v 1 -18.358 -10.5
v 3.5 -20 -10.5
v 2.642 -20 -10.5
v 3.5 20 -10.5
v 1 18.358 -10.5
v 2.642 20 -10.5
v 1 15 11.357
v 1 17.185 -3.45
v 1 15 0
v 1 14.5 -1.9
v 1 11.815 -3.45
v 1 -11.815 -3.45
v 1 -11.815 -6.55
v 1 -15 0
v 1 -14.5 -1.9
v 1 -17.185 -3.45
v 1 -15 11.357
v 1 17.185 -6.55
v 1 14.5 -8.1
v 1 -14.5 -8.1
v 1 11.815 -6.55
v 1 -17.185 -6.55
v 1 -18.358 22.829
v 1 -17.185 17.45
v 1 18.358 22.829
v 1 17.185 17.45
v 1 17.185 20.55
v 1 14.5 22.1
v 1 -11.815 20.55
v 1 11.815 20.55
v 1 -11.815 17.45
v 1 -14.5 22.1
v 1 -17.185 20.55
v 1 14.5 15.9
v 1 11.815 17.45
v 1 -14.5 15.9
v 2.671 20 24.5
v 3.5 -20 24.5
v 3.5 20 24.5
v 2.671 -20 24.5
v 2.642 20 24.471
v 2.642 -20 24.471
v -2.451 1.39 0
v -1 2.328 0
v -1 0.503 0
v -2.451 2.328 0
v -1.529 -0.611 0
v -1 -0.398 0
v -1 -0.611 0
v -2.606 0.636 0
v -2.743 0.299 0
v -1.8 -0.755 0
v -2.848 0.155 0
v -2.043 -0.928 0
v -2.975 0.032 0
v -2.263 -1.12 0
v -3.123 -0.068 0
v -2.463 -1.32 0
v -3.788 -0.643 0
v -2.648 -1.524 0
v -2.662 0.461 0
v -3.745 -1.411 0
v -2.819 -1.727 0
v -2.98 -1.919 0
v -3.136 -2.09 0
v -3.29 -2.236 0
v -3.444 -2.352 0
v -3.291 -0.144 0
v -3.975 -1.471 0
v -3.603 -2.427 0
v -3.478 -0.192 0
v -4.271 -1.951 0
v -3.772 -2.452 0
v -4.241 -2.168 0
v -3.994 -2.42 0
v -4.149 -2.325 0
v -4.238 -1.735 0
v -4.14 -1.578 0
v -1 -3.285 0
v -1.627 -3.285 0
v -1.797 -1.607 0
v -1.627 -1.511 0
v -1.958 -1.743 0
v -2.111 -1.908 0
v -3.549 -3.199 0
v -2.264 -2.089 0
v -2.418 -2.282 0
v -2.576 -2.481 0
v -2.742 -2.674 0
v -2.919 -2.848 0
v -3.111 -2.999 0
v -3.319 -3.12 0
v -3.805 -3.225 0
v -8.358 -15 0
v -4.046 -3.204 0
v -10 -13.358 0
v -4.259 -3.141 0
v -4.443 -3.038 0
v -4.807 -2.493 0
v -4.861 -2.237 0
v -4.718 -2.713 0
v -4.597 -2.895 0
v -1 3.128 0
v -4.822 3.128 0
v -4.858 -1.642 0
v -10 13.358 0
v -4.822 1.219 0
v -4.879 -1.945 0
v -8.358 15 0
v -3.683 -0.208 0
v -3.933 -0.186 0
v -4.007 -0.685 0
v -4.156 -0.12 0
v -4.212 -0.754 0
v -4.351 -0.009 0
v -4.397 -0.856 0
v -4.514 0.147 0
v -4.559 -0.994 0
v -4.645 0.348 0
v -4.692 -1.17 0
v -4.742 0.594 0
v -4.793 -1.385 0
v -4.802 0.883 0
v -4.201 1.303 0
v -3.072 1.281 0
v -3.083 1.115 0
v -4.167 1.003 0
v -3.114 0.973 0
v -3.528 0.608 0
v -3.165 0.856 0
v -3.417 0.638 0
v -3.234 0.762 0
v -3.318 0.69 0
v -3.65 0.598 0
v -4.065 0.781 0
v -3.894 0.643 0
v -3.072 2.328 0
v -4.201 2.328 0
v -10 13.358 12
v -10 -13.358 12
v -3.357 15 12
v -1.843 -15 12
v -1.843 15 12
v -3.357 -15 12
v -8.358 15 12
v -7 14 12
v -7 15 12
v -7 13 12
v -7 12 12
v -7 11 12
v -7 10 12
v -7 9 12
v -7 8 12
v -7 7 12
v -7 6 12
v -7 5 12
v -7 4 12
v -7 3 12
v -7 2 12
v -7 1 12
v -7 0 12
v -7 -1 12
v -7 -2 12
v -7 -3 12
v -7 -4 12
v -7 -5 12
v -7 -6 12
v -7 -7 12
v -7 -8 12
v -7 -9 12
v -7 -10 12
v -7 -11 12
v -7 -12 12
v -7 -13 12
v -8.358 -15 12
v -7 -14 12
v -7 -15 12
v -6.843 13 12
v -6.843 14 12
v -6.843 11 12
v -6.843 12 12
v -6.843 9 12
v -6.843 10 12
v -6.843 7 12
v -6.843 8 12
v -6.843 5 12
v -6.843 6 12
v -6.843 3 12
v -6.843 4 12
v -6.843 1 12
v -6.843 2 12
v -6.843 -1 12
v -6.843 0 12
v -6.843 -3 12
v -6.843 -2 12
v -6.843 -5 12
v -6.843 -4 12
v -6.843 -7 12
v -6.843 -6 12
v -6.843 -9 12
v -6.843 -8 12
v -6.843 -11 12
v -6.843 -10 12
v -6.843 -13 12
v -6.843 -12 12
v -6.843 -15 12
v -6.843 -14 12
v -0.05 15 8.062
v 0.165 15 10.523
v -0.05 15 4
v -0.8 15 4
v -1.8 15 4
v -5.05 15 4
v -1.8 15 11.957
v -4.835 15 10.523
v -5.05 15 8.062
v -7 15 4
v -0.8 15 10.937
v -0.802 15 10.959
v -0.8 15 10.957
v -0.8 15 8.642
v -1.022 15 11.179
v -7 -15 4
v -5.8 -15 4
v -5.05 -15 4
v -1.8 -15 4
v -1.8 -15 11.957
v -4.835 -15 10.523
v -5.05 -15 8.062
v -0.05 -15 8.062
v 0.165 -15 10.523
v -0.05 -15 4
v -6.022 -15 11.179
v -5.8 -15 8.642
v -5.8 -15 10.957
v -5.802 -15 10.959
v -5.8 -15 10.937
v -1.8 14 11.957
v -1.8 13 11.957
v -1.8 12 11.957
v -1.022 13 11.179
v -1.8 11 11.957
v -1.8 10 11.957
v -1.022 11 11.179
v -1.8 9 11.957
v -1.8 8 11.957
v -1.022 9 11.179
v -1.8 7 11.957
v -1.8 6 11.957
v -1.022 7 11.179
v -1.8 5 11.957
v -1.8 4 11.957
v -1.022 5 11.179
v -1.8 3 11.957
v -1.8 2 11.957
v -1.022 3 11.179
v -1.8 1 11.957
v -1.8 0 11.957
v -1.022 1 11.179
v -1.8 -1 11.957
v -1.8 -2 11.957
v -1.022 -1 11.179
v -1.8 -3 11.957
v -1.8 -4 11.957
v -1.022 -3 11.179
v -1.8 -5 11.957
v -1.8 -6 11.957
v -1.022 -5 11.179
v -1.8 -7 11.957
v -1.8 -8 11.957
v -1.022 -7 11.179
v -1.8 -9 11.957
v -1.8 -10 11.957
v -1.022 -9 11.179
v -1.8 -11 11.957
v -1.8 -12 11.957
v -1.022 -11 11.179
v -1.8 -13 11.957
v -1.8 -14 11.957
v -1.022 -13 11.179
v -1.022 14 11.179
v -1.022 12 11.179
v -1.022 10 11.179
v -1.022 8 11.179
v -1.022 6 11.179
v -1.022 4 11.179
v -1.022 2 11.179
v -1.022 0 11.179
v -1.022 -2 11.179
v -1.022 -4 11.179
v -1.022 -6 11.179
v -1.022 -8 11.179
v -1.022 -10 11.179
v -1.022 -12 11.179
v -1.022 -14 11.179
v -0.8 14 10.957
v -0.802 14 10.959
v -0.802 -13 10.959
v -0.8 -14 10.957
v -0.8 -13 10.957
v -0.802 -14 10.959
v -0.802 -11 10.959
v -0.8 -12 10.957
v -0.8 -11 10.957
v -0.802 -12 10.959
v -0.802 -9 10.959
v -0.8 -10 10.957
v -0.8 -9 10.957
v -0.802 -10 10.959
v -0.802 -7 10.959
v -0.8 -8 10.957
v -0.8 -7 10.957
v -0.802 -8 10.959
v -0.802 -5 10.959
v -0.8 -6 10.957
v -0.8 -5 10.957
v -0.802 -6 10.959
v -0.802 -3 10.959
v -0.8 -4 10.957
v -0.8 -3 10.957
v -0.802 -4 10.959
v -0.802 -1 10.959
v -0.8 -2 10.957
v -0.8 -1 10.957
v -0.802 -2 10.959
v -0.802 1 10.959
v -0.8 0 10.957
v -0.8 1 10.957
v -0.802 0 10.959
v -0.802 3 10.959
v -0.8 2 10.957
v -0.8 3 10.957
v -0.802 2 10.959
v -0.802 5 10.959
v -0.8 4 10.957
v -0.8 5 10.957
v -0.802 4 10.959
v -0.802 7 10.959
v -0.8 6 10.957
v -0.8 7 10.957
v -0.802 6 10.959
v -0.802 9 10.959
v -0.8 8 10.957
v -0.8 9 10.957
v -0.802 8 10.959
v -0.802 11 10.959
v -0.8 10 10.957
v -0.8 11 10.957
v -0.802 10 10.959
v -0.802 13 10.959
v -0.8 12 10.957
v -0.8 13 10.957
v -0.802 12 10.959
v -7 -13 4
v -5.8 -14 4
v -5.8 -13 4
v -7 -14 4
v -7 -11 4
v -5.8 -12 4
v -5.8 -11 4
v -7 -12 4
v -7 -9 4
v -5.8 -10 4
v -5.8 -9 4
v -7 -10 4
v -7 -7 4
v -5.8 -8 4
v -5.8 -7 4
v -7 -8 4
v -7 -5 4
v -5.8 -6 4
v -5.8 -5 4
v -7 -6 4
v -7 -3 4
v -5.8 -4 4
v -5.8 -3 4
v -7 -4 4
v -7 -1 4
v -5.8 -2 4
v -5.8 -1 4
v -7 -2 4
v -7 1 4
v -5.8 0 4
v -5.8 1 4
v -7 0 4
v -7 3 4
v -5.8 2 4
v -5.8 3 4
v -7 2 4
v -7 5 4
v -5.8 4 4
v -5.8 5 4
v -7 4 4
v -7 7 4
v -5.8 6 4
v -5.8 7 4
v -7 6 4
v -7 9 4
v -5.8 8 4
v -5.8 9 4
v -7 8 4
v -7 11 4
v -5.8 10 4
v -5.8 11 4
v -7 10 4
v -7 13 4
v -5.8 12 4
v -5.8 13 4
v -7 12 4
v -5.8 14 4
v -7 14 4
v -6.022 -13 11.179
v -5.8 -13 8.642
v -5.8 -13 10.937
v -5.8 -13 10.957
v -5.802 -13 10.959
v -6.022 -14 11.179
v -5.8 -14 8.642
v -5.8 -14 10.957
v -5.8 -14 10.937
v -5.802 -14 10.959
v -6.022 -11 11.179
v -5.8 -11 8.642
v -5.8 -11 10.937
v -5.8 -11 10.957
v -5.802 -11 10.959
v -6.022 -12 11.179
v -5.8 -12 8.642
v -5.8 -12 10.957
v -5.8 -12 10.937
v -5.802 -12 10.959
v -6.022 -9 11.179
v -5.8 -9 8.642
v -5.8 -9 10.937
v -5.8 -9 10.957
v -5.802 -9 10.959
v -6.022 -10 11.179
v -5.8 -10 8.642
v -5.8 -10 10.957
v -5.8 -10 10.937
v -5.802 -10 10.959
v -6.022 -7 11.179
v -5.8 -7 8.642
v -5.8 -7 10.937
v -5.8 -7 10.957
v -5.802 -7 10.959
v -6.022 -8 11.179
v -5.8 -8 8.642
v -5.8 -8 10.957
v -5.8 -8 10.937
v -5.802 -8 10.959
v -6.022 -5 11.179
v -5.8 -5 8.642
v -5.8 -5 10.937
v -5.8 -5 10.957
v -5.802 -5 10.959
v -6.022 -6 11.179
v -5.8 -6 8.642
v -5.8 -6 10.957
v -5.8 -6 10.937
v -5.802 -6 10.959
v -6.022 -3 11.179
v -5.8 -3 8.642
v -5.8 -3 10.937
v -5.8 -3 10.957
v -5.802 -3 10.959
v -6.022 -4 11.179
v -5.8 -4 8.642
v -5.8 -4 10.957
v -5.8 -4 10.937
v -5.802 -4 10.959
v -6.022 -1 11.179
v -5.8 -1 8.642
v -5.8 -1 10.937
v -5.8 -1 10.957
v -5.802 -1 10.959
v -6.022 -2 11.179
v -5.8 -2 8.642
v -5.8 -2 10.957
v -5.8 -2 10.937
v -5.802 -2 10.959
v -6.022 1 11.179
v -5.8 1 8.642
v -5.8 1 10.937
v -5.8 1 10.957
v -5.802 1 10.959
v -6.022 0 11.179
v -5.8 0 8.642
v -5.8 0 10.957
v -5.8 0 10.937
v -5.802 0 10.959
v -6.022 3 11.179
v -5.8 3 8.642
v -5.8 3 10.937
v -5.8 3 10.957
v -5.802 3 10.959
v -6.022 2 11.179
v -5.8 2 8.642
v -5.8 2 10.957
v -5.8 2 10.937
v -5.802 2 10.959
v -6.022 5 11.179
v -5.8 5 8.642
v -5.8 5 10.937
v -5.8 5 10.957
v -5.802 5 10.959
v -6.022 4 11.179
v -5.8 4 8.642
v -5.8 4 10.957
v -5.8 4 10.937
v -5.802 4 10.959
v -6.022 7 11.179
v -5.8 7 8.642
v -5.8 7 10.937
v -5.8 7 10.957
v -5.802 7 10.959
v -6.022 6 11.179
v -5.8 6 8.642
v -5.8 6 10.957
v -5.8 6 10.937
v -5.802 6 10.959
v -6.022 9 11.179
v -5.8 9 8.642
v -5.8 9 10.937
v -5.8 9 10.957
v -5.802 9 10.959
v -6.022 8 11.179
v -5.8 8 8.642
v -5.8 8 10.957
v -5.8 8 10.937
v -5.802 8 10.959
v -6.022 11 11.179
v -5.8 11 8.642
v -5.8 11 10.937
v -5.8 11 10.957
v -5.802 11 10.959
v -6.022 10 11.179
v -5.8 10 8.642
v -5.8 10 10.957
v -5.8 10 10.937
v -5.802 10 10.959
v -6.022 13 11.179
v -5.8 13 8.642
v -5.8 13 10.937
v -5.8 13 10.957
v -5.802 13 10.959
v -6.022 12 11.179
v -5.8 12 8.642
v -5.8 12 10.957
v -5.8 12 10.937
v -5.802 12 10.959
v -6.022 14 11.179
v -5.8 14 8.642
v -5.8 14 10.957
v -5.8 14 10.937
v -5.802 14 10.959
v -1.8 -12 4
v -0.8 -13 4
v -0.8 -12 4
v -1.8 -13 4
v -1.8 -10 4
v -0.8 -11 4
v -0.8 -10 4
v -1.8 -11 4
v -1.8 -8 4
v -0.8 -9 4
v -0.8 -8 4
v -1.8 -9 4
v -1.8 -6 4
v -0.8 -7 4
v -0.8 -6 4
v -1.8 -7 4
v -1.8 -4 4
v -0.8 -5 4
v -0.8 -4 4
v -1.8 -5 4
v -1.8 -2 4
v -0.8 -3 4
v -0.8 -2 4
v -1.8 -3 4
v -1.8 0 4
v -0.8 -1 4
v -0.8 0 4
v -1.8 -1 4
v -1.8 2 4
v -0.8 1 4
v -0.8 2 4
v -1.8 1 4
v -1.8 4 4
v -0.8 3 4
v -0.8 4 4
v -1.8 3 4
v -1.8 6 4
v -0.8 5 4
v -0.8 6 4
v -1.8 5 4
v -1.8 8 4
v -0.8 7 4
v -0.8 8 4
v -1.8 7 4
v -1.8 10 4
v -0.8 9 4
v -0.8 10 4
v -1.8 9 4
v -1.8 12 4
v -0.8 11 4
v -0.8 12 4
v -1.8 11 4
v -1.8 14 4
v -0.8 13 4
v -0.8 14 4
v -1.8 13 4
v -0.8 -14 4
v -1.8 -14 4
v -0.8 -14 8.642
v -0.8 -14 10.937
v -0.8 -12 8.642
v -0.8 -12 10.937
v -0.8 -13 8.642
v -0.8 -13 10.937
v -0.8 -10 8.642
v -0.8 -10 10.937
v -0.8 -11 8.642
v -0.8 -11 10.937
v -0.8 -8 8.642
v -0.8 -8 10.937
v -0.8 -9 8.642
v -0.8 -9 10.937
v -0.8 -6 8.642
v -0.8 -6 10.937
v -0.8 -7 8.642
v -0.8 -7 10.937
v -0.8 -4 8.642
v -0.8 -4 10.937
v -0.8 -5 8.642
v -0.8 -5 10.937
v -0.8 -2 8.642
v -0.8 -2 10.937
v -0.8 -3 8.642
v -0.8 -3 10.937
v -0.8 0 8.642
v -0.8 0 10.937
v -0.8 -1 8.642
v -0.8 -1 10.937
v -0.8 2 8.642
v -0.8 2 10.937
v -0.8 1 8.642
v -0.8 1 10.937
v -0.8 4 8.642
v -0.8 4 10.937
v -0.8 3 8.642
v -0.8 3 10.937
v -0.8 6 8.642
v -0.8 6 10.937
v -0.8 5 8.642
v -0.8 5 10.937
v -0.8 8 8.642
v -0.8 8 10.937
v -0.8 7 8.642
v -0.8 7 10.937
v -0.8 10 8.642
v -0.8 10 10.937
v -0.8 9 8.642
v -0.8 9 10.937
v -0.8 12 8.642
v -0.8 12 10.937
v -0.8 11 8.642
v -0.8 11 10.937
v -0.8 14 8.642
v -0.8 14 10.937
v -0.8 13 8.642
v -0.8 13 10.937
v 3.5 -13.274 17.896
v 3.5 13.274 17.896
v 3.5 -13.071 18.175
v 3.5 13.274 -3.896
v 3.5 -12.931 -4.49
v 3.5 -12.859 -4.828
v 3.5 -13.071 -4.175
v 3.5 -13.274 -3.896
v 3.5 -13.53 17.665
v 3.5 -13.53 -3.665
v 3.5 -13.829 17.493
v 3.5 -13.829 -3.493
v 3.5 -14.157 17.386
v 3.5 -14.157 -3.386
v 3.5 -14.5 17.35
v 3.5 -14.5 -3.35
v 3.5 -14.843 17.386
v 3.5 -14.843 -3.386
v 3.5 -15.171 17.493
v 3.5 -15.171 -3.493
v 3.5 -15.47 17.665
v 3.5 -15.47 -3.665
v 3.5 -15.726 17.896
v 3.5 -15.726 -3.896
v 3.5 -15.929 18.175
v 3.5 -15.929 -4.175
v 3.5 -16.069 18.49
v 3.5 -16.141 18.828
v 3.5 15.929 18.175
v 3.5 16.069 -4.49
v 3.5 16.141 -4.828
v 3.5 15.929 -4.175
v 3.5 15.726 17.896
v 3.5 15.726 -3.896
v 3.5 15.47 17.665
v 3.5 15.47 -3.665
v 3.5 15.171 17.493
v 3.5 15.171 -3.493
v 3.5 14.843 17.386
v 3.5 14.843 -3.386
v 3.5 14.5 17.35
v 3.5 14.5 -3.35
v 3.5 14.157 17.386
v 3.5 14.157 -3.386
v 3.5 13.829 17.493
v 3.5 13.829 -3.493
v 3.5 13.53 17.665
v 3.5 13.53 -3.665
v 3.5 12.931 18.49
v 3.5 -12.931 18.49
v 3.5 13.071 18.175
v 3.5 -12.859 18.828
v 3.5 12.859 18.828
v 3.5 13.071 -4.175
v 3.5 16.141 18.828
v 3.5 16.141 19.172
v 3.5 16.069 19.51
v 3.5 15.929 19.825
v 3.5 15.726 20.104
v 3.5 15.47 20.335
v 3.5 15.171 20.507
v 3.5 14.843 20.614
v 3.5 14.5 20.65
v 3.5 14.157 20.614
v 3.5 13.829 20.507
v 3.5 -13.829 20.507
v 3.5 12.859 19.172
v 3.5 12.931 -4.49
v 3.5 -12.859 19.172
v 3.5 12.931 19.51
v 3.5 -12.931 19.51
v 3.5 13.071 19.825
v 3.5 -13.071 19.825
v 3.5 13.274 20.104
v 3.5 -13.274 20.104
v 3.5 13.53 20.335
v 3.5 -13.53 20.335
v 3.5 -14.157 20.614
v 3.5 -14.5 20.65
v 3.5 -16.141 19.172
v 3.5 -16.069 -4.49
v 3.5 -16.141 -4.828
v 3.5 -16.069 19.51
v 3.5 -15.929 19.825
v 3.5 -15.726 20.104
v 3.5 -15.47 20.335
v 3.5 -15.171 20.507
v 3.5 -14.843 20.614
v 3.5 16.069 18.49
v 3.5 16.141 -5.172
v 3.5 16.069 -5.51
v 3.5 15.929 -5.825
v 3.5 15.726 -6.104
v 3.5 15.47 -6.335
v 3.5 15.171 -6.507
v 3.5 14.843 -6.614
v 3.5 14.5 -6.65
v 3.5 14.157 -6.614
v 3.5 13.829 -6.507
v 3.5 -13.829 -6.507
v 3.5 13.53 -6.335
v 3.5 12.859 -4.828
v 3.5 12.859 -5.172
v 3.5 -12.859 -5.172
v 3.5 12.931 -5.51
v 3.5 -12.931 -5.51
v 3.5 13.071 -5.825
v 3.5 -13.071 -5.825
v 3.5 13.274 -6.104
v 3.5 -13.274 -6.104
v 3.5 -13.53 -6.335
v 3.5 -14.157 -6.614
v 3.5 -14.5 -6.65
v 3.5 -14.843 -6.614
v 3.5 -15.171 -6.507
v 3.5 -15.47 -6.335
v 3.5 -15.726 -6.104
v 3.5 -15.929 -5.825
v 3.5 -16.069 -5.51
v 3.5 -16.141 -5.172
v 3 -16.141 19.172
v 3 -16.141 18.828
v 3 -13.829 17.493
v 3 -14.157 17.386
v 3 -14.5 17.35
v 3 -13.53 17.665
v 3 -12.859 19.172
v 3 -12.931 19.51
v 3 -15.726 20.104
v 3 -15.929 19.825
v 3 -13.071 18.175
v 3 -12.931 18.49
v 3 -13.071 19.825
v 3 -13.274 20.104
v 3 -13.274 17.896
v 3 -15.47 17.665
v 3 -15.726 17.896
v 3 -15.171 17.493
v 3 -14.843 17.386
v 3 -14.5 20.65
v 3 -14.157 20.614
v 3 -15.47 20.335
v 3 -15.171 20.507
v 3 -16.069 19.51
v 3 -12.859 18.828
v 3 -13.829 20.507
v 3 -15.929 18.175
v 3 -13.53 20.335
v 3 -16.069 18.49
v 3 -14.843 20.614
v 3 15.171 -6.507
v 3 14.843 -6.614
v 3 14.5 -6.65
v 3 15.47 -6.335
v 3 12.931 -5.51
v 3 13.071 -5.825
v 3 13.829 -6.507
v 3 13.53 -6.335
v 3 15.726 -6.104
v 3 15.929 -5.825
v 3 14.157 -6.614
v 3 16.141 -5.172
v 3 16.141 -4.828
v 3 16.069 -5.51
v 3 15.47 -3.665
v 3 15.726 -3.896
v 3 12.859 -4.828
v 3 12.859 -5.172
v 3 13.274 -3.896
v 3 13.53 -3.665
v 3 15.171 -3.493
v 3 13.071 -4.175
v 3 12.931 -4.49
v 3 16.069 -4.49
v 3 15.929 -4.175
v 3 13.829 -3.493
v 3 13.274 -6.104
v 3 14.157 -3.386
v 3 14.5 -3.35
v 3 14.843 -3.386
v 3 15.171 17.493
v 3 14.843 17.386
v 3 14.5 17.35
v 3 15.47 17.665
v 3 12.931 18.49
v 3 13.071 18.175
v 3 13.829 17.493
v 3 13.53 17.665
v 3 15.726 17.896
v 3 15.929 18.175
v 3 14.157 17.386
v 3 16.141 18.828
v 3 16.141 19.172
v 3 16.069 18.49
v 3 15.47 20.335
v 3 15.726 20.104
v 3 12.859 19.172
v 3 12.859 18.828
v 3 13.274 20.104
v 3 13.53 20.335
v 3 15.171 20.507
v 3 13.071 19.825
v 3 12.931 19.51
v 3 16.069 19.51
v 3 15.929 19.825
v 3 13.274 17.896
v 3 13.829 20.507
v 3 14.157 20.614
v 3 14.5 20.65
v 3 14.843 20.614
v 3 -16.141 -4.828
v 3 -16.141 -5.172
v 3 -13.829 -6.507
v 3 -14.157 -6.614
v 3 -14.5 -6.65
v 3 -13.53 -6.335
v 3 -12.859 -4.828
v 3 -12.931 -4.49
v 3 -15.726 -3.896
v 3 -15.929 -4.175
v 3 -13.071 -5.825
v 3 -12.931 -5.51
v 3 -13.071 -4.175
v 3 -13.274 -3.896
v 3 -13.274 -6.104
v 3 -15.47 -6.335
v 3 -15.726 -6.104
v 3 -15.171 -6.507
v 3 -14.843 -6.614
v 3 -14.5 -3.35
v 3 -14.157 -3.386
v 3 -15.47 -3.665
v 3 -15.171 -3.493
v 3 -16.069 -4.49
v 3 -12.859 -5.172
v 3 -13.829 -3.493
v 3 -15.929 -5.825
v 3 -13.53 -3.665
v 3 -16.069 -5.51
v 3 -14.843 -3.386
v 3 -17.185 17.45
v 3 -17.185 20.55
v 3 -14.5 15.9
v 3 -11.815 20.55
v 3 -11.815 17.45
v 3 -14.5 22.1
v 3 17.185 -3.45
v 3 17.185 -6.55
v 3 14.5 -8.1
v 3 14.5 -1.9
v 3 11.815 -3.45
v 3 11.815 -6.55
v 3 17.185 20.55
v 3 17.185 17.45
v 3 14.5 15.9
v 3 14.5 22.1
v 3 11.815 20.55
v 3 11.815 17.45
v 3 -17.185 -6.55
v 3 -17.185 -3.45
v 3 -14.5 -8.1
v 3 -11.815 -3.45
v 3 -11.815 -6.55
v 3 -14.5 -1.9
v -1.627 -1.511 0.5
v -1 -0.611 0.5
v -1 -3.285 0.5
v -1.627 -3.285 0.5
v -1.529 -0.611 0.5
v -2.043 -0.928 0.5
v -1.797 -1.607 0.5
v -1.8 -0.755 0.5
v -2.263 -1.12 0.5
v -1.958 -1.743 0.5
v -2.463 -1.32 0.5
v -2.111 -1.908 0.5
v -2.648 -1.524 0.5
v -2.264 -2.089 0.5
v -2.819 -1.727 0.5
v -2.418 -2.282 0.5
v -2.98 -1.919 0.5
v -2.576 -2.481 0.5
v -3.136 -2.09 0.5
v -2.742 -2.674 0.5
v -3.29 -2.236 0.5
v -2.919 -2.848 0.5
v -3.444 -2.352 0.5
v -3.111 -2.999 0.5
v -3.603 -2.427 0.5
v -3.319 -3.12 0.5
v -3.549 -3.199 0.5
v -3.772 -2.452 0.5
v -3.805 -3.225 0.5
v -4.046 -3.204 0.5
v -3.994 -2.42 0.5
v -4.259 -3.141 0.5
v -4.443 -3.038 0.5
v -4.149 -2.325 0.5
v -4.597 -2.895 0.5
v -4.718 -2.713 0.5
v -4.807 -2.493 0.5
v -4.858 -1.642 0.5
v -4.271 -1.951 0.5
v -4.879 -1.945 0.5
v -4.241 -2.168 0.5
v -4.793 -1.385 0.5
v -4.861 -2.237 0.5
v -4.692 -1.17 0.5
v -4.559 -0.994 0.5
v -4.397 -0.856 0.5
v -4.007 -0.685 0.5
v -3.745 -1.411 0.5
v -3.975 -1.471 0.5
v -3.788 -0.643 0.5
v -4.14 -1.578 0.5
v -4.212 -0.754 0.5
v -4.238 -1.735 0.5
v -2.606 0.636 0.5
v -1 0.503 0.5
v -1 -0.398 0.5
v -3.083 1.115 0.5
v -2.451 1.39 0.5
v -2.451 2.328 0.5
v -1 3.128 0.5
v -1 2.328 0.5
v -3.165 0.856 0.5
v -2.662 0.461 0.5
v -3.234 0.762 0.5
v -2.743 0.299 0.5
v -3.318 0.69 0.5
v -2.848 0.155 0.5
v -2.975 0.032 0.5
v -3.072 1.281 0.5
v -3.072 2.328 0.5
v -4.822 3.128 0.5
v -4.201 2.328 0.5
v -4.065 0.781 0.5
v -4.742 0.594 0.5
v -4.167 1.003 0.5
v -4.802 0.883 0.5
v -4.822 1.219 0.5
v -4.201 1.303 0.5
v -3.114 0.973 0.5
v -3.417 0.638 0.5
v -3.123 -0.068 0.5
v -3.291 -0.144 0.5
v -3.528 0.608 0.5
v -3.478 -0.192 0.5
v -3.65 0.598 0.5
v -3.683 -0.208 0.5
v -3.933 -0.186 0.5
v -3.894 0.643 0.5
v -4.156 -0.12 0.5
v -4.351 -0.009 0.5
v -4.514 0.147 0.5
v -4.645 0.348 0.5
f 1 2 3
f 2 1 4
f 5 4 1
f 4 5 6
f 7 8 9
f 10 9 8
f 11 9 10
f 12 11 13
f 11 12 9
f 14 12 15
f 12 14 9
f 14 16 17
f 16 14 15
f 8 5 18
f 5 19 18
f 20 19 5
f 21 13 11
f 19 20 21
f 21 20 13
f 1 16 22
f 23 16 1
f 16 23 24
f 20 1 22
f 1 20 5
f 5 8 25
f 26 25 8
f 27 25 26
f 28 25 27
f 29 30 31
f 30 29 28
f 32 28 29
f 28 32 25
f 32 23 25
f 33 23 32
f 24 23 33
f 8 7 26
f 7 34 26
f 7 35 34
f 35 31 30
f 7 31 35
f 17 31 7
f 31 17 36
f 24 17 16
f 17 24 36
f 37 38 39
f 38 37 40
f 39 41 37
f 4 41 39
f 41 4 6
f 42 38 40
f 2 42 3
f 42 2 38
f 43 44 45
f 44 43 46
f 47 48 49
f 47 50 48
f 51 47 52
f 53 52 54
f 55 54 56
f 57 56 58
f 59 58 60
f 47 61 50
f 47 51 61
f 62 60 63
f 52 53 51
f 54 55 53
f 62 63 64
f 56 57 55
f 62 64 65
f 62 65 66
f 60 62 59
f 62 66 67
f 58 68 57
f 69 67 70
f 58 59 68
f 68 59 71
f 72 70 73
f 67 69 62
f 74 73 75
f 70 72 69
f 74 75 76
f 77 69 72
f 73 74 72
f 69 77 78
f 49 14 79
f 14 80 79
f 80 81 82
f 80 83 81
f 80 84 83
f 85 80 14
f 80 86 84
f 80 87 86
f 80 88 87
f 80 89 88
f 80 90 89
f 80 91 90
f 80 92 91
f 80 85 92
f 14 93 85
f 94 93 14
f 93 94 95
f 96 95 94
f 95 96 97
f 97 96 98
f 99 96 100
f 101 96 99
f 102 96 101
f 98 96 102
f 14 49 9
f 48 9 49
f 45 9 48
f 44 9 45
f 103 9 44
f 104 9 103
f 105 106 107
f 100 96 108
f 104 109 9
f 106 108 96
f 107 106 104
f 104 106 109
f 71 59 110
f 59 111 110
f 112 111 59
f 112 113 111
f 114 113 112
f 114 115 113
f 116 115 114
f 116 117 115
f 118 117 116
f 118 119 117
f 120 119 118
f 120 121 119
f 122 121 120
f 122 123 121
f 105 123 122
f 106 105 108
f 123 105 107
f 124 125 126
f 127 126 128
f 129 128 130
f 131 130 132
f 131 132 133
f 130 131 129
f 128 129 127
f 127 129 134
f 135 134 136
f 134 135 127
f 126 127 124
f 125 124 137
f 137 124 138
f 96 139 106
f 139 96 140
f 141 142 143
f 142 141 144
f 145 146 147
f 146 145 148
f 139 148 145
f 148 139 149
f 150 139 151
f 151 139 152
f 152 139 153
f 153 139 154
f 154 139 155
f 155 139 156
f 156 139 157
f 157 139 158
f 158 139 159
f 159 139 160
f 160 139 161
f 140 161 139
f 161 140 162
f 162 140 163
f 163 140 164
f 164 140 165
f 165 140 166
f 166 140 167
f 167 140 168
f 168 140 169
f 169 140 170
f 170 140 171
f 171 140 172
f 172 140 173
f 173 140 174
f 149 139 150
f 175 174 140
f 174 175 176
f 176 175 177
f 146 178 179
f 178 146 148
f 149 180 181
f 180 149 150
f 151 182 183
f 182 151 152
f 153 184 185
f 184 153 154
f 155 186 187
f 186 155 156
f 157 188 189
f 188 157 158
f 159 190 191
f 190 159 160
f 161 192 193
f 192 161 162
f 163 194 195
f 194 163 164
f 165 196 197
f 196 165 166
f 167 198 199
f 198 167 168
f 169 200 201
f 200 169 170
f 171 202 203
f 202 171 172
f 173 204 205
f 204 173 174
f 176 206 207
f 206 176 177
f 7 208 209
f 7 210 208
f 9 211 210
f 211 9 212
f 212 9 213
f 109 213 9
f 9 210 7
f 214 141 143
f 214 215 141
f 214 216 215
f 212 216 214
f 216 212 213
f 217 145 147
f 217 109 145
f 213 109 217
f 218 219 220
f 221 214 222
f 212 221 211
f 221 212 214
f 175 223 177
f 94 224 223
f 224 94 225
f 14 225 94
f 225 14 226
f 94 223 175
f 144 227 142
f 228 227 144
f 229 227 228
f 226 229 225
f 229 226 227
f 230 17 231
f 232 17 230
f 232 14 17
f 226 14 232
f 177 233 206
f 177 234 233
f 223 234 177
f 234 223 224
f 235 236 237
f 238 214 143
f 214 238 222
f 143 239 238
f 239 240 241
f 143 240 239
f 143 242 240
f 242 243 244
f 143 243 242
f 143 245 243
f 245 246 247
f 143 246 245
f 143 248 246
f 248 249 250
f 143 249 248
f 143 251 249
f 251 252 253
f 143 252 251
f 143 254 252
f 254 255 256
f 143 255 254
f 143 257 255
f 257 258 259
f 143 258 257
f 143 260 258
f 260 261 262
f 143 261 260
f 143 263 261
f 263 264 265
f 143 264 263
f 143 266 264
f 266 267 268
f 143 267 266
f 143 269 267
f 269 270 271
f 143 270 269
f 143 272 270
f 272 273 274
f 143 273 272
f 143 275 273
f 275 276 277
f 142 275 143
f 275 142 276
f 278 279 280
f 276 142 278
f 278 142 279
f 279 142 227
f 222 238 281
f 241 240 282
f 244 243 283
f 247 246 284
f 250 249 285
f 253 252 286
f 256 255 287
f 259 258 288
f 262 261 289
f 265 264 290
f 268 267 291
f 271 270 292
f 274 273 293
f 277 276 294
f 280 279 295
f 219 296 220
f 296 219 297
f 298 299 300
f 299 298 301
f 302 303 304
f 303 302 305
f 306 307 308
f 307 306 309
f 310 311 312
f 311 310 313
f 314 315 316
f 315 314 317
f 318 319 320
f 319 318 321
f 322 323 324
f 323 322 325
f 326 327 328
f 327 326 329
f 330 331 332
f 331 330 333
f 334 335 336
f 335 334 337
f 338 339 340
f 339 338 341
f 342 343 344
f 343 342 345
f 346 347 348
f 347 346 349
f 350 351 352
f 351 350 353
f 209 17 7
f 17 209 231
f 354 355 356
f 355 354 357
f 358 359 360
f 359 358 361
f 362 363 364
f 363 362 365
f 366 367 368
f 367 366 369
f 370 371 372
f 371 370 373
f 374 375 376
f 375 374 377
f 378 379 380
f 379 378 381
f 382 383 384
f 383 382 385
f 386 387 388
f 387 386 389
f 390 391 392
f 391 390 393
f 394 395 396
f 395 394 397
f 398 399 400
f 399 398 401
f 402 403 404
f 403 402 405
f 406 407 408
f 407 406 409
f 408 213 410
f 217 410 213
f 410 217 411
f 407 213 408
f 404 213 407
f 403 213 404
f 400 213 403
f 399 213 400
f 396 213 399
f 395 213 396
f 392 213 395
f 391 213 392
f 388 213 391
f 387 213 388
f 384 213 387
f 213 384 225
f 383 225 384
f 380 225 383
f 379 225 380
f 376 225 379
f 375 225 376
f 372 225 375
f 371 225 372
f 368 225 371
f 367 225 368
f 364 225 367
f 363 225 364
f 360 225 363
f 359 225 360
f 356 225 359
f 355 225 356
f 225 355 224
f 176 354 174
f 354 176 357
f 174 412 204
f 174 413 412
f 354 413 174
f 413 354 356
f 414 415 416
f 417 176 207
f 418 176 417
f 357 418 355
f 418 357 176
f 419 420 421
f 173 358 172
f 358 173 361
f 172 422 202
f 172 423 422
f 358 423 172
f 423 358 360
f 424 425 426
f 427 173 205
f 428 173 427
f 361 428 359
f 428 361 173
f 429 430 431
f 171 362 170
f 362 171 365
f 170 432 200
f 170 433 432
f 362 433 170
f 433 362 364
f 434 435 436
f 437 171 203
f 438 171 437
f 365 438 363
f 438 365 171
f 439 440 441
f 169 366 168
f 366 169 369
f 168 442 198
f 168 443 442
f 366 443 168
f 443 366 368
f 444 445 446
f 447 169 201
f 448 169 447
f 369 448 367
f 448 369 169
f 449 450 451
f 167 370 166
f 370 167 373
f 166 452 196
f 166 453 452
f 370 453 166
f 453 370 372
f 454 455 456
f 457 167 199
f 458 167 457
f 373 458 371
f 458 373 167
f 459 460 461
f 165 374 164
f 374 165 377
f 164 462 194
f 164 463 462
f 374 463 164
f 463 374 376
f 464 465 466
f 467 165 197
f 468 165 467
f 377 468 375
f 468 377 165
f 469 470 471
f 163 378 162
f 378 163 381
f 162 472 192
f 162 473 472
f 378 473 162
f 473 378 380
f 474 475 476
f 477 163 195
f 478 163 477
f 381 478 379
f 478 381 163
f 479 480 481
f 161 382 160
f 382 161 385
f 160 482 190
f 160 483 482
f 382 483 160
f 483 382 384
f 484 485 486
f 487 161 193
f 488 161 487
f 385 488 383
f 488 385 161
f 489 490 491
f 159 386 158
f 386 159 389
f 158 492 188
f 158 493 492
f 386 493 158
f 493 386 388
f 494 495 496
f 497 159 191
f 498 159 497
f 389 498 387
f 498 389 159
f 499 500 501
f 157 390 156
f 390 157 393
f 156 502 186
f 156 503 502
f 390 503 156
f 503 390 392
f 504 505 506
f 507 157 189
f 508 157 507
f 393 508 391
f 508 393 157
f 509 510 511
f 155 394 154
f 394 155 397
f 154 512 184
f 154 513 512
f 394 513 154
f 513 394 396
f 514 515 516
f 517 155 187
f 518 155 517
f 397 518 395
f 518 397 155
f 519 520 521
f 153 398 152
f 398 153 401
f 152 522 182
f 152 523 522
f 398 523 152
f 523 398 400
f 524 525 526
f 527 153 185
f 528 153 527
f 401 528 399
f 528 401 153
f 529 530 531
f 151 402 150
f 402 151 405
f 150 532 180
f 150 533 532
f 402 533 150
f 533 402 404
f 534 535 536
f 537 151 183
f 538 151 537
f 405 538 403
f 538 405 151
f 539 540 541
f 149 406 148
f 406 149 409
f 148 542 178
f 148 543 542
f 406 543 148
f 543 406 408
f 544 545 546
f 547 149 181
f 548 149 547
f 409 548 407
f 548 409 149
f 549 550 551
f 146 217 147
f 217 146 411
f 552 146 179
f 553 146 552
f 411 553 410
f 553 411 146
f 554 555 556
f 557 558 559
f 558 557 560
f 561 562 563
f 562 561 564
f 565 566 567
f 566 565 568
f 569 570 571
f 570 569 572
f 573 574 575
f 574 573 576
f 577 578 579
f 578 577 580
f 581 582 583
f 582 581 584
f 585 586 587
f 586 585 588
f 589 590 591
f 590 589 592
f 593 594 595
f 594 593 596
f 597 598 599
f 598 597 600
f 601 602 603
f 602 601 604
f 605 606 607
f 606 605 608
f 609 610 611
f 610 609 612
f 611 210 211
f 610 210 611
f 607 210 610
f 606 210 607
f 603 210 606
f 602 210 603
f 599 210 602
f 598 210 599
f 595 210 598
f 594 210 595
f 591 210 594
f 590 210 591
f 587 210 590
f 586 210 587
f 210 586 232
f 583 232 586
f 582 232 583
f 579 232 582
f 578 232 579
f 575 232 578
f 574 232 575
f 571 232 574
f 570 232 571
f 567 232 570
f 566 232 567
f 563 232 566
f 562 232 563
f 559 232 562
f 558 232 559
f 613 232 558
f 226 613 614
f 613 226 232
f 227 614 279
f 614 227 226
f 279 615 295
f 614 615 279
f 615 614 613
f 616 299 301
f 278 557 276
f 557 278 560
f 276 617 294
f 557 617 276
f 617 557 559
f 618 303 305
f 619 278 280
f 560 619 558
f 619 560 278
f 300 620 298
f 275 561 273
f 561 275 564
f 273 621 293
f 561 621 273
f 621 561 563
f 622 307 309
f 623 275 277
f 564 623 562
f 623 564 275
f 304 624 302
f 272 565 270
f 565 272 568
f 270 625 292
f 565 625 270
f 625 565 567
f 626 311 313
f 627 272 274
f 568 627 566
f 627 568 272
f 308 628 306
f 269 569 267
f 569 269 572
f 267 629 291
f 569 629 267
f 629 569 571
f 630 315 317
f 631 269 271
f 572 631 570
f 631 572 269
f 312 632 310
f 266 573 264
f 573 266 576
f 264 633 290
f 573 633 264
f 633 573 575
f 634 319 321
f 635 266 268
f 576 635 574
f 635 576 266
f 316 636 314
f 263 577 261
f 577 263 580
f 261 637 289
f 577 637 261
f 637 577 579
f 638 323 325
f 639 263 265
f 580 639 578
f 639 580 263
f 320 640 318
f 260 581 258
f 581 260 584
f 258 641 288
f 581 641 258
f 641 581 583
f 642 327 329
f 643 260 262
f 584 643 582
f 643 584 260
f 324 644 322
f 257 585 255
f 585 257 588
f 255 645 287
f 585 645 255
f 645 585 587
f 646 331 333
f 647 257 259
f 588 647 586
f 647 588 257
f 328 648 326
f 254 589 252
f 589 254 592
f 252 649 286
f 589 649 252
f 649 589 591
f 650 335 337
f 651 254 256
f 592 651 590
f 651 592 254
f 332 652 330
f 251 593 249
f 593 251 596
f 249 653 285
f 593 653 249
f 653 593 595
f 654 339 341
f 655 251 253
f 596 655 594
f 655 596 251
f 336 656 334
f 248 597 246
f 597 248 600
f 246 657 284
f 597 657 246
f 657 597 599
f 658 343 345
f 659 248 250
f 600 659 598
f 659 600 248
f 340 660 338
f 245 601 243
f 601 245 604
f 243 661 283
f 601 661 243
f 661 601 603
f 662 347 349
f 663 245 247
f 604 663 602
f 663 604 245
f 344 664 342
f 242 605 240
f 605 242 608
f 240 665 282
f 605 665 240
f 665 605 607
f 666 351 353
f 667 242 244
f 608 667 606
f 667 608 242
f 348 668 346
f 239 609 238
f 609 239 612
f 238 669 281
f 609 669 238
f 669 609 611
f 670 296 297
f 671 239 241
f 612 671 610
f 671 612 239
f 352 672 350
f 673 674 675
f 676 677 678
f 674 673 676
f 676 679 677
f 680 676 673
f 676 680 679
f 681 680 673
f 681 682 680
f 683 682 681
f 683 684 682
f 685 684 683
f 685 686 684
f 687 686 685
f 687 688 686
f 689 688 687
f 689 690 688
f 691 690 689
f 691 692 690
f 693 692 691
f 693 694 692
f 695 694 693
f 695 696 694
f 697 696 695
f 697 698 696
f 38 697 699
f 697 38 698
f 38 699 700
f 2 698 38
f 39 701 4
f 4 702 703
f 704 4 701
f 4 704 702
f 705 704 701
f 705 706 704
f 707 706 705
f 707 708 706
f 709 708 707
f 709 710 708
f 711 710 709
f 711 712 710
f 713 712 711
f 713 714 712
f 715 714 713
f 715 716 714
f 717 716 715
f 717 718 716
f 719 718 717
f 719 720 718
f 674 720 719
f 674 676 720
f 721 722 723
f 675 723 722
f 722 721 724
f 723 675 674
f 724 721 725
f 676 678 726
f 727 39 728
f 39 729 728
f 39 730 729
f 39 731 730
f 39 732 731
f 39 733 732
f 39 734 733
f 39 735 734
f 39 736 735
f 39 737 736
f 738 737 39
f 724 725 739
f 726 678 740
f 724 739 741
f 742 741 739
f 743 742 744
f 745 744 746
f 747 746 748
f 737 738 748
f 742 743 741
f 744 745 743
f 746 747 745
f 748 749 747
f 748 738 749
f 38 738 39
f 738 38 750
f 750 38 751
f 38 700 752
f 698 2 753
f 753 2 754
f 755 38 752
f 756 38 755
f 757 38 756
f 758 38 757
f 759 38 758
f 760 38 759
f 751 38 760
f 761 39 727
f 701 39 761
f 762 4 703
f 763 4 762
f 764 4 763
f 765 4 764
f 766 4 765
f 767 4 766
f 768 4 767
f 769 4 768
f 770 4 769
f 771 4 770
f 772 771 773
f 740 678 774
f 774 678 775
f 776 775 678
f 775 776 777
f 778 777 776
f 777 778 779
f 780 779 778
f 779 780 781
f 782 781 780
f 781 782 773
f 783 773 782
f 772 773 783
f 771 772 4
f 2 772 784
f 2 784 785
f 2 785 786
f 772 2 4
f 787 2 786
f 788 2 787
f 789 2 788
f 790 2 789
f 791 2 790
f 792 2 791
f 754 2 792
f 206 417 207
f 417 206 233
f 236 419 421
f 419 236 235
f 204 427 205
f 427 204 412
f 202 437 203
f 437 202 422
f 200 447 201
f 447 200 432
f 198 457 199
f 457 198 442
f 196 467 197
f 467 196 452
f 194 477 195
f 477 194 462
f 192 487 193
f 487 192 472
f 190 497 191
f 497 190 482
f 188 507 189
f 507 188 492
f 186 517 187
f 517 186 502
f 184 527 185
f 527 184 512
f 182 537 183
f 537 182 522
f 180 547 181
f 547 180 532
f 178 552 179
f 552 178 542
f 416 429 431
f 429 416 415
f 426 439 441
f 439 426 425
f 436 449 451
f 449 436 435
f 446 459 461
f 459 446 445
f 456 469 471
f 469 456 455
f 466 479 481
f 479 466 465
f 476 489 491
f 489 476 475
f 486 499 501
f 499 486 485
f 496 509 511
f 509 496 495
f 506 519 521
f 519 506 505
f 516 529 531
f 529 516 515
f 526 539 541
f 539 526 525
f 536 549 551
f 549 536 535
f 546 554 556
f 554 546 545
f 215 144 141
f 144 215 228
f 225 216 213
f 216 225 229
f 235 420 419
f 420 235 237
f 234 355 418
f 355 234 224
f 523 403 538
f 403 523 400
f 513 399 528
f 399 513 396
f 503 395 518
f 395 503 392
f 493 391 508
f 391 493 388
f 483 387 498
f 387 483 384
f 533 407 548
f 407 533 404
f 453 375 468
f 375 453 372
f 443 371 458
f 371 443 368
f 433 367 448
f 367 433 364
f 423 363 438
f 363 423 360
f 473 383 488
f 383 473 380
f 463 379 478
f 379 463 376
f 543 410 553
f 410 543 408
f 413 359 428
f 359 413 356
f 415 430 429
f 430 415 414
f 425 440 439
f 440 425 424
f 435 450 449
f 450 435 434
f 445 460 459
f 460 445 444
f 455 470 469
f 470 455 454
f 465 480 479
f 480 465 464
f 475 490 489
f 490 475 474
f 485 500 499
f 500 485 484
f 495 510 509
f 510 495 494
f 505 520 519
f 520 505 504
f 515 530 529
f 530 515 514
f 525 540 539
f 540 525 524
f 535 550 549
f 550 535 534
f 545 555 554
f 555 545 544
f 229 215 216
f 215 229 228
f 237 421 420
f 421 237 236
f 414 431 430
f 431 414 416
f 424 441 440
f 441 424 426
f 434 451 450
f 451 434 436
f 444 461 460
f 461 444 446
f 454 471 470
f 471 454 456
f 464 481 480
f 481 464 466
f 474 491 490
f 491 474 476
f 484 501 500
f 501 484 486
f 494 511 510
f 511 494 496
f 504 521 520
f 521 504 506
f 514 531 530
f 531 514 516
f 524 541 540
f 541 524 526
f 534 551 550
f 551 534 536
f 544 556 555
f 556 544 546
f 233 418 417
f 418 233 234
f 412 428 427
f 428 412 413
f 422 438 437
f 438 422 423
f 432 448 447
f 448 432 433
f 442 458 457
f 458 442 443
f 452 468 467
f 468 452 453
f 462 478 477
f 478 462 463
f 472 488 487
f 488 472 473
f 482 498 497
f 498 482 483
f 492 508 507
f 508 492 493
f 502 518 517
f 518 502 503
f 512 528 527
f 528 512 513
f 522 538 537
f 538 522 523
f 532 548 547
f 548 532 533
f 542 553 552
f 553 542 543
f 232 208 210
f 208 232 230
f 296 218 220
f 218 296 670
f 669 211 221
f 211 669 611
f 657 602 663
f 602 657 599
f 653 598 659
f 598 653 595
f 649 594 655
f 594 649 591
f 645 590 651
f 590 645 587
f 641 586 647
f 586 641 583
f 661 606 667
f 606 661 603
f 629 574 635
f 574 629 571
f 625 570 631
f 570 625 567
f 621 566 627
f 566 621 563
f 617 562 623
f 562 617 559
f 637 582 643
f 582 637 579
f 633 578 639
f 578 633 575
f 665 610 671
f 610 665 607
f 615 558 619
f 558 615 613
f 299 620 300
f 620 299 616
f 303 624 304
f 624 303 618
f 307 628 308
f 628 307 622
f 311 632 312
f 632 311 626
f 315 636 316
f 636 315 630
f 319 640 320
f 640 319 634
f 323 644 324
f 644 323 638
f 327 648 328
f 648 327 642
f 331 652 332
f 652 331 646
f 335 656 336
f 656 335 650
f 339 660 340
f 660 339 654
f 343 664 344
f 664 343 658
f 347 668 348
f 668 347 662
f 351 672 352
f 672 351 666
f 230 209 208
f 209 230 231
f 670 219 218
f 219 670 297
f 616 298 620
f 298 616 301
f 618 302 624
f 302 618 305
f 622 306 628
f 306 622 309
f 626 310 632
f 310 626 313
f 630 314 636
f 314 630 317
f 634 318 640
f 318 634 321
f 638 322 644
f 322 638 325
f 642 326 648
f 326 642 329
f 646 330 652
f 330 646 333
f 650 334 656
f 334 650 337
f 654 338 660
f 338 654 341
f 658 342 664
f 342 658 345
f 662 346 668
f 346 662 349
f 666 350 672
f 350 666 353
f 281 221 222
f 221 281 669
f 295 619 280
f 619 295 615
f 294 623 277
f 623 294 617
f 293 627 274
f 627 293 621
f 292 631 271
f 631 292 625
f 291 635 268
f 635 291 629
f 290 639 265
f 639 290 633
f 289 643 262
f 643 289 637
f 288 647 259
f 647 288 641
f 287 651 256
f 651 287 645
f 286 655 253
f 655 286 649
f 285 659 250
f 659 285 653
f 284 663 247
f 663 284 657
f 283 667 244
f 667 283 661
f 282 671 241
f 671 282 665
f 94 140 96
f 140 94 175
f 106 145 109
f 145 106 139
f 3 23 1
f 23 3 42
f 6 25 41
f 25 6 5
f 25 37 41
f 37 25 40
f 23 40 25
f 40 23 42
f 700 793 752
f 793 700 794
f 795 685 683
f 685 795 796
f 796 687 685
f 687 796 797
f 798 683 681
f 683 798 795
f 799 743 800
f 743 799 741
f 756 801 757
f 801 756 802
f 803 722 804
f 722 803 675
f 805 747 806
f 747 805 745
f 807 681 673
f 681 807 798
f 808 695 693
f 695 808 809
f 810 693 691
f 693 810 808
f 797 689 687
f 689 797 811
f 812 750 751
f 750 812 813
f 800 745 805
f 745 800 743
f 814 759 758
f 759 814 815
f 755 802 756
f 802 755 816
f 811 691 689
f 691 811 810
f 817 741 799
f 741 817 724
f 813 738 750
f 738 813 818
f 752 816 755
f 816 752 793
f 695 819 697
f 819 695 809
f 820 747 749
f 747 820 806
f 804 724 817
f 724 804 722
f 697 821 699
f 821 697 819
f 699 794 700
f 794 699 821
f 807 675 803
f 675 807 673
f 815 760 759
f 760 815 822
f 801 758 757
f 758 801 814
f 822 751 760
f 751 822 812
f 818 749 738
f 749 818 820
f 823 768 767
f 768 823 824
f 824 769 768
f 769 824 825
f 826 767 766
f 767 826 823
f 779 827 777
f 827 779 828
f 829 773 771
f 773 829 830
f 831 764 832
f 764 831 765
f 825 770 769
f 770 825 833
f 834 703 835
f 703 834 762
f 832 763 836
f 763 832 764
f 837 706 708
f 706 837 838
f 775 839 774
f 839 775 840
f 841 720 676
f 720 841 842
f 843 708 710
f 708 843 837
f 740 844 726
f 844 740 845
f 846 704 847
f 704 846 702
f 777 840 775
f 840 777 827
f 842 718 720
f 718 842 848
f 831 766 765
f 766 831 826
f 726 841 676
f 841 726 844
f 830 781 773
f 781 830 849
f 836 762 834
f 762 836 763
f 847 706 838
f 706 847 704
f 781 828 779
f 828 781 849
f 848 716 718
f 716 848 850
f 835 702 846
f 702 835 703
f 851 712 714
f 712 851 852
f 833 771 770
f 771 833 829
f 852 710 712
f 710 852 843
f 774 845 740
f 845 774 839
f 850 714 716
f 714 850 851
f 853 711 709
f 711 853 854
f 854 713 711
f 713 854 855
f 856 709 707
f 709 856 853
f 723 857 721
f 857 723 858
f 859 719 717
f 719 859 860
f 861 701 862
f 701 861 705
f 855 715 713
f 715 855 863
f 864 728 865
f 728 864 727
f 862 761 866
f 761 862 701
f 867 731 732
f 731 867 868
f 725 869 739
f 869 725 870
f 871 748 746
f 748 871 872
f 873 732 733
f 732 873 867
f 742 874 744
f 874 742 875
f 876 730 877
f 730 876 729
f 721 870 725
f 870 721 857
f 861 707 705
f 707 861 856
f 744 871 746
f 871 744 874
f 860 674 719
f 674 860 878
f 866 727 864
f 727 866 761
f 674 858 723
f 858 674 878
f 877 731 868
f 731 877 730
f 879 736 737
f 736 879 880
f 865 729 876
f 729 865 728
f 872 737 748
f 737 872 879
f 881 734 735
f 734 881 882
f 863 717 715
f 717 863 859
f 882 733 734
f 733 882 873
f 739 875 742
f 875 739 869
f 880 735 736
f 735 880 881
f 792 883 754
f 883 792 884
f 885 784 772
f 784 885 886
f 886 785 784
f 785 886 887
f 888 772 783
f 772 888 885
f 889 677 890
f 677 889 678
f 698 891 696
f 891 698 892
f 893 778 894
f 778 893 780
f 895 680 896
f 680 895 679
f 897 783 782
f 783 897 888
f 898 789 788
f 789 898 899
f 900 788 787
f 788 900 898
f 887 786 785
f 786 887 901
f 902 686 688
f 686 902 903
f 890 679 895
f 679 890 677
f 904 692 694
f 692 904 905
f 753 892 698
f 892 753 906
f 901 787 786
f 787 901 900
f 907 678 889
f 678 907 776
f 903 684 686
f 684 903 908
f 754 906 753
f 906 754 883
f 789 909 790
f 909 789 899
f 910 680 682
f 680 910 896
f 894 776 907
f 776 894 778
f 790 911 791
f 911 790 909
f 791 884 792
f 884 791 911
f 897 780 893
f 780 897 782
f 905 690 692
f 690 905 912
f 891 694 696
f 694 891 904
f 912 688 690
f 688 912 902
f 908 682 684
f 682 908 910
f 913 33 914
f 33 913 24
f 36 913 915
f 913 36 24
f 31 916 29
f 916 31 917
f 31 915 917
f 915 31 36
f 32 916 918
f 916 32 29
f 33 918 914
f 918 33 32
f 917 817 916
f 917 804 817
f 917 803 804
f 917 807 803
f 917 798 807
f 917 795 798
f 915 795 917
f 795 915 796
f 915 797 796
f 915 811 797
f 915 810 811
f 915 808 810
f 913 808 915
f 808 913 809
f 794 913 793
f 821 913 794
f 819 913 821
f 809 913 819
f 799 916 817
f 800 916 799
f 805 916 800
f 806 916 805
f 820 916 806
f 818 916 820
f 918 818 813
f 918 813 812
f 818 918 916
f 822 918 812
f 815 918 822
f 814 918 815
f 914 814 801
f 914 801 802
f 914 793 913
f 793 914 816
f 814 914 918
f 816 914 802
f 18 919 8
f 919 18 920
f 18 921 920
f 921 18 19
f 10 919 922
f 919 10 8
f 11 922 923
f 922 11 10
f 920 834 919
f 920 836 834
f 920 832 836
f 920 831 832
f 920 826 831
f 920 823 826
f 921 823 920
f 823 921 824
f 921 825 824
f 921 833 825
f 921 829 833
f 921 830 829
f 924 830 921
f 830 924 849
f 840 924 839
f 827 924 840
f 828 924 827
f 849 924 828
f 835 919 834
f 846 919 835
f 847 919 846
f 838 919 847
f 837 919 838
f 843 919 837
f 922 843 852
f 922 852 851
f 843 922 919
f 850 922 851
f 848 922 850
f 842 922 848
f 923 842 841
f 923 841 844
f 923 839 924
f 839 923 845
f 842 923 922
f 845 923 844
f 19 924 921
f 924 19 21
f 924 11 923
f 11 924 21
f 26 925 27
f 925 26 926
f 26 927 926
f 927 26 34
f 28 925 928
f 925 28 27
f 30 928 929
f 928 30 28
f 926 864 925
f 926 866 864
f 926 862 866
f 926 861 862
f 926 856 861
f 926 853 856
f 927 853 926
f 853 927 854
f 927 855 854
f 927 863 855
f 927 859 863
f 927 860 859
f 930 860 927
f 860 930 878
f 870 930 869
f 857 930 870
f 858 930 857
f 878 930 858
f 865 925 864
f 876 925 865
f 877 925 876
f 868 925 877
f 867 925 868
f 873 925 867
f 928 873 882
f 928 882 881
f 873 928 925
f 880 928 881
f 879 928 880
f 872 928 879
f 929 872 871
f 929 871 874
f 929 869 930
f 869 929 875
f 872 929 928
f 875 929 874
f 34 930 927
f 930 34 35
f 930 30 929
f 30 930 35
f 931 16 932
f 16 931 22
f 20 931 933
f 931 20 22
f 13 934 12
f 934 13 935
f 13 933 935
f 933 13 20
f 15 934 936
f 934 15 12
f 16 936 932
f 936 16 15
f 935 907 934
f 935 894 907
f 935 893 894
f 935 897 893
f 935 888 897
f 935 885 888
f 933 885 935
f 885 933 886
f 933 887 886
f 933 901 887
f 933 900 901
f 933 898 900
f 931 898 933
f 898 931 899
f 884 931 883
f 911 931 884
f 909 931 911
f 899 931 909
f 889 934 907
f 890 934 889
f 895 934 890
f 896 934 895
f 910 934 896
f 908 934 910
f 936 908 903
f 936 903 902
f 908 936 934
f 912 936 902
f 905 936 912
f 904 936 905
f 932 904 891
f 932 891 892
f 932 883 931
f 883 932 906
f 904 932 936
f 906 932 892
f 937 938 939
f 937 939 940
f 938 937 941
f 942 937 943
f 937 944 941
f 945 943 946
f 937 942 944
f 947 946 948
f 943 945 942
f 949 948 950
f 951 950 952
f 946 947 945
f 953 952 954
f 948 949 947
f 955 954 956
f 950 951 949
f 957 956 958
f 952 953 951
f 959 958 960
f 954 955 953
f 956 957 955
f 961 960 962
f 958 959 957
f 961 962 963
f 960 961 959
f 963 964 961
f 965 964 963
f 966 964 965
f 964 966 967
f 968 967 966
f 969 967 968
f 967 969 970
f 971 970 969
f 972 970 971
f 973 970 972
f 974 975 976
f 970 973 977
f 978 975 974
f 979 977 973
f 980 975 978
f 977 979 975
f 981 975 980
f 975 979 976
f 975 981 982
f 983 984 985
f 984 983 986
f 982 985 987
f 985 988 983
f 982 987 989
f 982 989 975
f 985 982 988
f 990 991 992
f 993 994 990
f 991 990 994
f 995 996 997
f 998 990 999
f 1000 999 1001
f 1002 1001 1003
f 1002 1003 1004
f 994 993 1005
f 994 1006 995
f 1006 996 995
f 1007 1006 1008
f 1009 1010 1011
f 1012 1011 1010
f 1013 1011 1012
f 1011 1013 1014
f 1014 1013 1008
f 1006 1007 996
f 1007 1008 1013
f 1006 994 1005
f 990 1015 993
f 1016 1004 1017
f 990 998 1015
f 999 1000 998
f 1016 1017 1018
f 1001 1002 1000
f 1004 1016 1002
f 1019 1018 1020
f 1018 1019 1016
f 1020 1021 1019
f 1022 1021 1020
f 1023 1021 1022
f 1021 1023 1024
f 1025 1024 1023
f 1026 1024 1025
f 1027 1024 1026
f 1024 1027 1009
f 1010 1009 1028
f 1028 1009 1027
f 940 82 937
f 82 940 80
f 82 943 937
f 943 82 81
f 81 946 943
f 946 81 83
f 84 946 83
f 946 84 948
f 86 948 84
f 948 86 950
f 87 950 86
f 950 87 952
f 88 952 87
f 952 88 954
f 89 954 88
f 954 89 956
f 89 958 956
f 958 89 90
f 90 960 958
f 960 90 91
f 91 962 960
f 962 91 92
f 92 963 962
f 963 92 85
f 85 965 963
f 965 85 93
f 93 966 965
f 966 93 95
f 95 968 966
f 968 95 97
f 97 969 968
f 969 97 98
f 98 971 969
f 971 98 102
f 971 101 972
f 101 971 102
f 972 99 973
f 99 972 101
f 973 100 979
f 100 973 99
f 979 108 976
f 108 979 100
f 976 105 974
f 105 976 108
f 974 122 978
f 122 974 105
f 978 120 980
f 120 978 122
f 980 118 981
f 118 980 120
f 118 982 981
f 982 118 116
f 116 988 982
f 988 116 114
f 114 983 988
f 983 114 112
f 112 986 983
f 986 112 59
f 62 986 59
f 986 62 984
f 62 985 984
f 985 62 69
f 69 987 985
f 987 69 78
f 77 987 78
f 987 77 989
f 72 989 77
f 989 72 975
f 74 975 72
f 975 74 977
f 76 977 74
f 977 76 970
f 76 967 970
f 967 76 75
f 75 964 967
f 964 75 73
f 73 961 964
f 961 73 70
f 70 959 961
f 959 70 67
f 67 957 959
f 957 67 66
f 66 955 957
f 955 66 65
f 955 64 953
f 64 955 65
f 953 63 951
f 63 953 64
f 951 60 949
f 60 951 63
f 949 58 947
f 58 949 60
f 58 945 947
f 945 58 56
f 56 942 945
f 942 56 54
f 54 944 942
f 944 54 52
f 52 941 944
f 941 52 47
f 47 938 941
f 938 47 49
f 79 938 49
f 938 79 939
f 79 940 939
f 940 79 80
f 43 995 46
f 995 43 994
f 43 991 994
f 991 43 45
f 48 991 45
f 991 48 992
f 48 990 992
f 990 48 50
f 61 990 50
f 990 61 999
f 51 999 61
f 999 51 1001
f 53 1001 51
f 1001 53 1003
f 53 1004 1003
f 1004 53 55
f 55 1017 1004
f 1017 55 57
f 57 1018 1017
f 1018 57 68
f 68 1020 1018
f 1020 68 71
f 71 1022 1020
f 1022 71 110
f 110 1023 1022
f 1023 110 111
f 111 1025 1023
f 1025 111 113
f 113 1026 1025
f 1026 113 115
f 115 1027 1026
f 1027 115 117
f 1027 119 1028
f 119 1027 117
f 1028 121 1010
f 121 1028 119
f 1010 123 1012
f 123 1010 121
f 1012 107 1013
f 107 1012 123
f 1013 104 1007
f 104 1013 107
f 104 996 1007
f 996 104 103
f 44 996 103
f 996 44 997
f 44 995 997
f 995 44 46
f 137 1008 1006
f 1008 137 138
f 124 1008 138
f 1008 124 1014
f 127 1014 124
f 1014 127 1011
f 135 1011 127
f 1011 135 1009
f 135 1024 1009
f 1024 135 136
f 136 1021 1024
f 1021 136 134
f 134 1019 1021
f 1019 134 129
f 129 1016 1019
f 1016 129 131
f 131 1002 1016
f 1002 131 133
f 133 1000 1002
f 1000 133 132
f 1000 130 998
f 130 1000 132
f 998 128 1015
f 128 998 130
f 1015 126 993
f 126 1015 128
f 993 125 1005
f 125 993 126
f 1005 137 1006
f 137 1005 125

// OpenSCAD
// PRUSA iteration4
// Y belt holder
// GNU GPL v3
// Josef Průša <iam@josefprusa.cz> and contributors
// http://www.reprap.org/wiki/Prusa_Mendel
// http://prusamendel.org

module y_belt_holder()
{

    difference()
    {
        // base block
        union()
        {
            // 6.5mm lower
            translate([-17.5,-20,41]) cube([35,40,5]);
            // 1mm lower again
            translate([-5,-15,30]) cube([12,30,16]);
        }
        
        // 2.5mm lower again
        translate([-18,-20.5,41+2.5]) cube([36,41,2.51]);

        // belt entry 
        difference() {
            translate([-7.5,-16,39.9]) rotate([0,45,0]) cube([3,32,3]);
            translate([-7,-16,41]) cube([3,32,3]);
        }
        translate([-7.5,-16,34.9]) rotate([0,45,0]) cube([3,32,3]);
        
        // lower belt slot
        translate([-8.5,-16,34.2]) cube([11.5,32,0.75]);
        translate([-8.5,-16,35.4]) rotate([0,5,0]) cube([11.5,32,0.2]);
        translate([-8.5,-16,33.6]) rotate([0,-5,0]) cube([11.5,32,0.2]);
        for (_step =[-16:2:16])
        {
            translate([-8.5,_step,33]) cube([11.5,1,1.5]);
        }
        
        // upper belt slot
        translate([-8.5,-16,39.2]) cube([11.5,32,0.75]);
        translate([-8.5,-16,40.4]) rotate([0,5,0]) cube([11.5,32,0.2]);
        translate([-8.5,-16,38.6]) rotate([0,-5,0]) cube([11.5,32,0.2]);
        for (_step =[-17:2:16])
        {
            translate([-8.5,_step,38.2]) cube([11.5,1,1.5]);
        }
        
        // nice edges
        translate([-8,-20,22.5]) rotate([45,0,0]) cube([16,10,10]);
        translate([-8,20,22.5]) rotate([45,0,0]) cube([16,10,10]);

        translate([-20,-25,33.5]) rotate([45,0,0]) cube([40,10,10]);
        translate([-20,25,33.5]) rotate([45,0,0]) cube([40,10,10]);
        translate([-22.2,-30,40.3]) rotate([0,45,0]) cube([5,60,5]);
        
        // mounting screw holes
        translate([-12,-14.5,40]) cylinder( h=30, r=1.65, $fn=30 );
        translate([12,14.50,40]) cylinder( h=30, r=1.65, $fn=30 );
        translate([-12,14.5,40]) cylinder( h=30, r=1.65, $fn=30 );
        translate([12,-14.50,40]) cylinder( h=30, r=1.65, $fn=30 );
        
        translate([-12,-14.5,36]) cylinder( h=7, r=3.1, $fn=6 );
        translate([12,14.5,36]) cylinder( h=7, r=3.1, $fn=6 );
        translate([-12,14.5,36]) cylinder( h=7, r=3.1, $fn=6 );
        translate([12,-14.5,36]) cylinder( h=7, r=3.1, $fn=6 );
        
    }
 

}

difference()
{
    translate([-40,0,7]) rotate([0,90,0]) y_belt_holder();
    //version   
    translate([-1,3.5,0.5]) rotate([0,180,90]) linear_extrude(height = 0.6) 
    { text("R2",font = "helvetica:style=Bold", size=4, center=true); }
}
    
